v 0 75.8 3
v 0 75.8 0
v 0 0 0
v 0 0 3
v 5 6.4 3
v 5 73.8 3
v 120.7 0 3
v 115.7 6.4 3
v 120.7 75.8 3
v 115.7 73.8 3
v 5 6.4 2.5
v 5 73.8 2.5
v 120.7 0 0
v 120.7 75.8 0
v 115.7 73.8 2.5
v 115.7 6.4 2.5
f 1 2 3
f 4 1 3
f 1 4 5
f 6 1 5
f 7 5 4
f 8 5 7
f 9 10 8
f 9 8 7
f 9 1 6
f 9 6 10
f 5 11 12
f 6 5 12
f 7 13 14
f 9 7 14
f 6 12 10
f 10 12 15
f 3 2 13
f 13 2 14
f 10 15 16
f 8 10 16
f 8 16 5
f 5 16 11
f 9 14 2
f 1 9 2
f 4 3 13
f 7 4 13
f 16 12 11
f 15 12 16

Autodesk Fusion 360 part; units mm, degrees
sketch "Sketch1" plane through (0, 0, 0) normal (0, 0, 1) x (1, 0, 0)
  line L0 (0, 0) -> (120.7, 0)
  line L1 (120.7, 0) -> (120.7, 75.8)
  line L2 (120.7, 75.8) -> (0, 75.8)
  line L3 (0, 75.8) -> (0, 0)
  line L4 (5, 73.8) -> (115.7, 73.8)
  line L5 (115.7, 73.8) -> (115.7, 6.4)
  line L6 (115.7, 6.4) -> (5, 6.4)
  line L7 (5, 6.4) -> (5, 73.8)
  dimension "d1" = 120.7
  dimension "d2" = 75.8
  dimension "d3" = 2
  dimension "d4" = 6.4
  dimension "d5" = 5
  dimension "d6" = 5
extrude "Extrude1" add sketch "Sketch1" along normal blind 3 contours L0 L1 L2 L3 | L4 L5 L6 L7
extrude "Extrude2" cut sketch "Sketch1" along normal blind 0.5 from surface at 2.5 contours L4 L5 L6 L7
